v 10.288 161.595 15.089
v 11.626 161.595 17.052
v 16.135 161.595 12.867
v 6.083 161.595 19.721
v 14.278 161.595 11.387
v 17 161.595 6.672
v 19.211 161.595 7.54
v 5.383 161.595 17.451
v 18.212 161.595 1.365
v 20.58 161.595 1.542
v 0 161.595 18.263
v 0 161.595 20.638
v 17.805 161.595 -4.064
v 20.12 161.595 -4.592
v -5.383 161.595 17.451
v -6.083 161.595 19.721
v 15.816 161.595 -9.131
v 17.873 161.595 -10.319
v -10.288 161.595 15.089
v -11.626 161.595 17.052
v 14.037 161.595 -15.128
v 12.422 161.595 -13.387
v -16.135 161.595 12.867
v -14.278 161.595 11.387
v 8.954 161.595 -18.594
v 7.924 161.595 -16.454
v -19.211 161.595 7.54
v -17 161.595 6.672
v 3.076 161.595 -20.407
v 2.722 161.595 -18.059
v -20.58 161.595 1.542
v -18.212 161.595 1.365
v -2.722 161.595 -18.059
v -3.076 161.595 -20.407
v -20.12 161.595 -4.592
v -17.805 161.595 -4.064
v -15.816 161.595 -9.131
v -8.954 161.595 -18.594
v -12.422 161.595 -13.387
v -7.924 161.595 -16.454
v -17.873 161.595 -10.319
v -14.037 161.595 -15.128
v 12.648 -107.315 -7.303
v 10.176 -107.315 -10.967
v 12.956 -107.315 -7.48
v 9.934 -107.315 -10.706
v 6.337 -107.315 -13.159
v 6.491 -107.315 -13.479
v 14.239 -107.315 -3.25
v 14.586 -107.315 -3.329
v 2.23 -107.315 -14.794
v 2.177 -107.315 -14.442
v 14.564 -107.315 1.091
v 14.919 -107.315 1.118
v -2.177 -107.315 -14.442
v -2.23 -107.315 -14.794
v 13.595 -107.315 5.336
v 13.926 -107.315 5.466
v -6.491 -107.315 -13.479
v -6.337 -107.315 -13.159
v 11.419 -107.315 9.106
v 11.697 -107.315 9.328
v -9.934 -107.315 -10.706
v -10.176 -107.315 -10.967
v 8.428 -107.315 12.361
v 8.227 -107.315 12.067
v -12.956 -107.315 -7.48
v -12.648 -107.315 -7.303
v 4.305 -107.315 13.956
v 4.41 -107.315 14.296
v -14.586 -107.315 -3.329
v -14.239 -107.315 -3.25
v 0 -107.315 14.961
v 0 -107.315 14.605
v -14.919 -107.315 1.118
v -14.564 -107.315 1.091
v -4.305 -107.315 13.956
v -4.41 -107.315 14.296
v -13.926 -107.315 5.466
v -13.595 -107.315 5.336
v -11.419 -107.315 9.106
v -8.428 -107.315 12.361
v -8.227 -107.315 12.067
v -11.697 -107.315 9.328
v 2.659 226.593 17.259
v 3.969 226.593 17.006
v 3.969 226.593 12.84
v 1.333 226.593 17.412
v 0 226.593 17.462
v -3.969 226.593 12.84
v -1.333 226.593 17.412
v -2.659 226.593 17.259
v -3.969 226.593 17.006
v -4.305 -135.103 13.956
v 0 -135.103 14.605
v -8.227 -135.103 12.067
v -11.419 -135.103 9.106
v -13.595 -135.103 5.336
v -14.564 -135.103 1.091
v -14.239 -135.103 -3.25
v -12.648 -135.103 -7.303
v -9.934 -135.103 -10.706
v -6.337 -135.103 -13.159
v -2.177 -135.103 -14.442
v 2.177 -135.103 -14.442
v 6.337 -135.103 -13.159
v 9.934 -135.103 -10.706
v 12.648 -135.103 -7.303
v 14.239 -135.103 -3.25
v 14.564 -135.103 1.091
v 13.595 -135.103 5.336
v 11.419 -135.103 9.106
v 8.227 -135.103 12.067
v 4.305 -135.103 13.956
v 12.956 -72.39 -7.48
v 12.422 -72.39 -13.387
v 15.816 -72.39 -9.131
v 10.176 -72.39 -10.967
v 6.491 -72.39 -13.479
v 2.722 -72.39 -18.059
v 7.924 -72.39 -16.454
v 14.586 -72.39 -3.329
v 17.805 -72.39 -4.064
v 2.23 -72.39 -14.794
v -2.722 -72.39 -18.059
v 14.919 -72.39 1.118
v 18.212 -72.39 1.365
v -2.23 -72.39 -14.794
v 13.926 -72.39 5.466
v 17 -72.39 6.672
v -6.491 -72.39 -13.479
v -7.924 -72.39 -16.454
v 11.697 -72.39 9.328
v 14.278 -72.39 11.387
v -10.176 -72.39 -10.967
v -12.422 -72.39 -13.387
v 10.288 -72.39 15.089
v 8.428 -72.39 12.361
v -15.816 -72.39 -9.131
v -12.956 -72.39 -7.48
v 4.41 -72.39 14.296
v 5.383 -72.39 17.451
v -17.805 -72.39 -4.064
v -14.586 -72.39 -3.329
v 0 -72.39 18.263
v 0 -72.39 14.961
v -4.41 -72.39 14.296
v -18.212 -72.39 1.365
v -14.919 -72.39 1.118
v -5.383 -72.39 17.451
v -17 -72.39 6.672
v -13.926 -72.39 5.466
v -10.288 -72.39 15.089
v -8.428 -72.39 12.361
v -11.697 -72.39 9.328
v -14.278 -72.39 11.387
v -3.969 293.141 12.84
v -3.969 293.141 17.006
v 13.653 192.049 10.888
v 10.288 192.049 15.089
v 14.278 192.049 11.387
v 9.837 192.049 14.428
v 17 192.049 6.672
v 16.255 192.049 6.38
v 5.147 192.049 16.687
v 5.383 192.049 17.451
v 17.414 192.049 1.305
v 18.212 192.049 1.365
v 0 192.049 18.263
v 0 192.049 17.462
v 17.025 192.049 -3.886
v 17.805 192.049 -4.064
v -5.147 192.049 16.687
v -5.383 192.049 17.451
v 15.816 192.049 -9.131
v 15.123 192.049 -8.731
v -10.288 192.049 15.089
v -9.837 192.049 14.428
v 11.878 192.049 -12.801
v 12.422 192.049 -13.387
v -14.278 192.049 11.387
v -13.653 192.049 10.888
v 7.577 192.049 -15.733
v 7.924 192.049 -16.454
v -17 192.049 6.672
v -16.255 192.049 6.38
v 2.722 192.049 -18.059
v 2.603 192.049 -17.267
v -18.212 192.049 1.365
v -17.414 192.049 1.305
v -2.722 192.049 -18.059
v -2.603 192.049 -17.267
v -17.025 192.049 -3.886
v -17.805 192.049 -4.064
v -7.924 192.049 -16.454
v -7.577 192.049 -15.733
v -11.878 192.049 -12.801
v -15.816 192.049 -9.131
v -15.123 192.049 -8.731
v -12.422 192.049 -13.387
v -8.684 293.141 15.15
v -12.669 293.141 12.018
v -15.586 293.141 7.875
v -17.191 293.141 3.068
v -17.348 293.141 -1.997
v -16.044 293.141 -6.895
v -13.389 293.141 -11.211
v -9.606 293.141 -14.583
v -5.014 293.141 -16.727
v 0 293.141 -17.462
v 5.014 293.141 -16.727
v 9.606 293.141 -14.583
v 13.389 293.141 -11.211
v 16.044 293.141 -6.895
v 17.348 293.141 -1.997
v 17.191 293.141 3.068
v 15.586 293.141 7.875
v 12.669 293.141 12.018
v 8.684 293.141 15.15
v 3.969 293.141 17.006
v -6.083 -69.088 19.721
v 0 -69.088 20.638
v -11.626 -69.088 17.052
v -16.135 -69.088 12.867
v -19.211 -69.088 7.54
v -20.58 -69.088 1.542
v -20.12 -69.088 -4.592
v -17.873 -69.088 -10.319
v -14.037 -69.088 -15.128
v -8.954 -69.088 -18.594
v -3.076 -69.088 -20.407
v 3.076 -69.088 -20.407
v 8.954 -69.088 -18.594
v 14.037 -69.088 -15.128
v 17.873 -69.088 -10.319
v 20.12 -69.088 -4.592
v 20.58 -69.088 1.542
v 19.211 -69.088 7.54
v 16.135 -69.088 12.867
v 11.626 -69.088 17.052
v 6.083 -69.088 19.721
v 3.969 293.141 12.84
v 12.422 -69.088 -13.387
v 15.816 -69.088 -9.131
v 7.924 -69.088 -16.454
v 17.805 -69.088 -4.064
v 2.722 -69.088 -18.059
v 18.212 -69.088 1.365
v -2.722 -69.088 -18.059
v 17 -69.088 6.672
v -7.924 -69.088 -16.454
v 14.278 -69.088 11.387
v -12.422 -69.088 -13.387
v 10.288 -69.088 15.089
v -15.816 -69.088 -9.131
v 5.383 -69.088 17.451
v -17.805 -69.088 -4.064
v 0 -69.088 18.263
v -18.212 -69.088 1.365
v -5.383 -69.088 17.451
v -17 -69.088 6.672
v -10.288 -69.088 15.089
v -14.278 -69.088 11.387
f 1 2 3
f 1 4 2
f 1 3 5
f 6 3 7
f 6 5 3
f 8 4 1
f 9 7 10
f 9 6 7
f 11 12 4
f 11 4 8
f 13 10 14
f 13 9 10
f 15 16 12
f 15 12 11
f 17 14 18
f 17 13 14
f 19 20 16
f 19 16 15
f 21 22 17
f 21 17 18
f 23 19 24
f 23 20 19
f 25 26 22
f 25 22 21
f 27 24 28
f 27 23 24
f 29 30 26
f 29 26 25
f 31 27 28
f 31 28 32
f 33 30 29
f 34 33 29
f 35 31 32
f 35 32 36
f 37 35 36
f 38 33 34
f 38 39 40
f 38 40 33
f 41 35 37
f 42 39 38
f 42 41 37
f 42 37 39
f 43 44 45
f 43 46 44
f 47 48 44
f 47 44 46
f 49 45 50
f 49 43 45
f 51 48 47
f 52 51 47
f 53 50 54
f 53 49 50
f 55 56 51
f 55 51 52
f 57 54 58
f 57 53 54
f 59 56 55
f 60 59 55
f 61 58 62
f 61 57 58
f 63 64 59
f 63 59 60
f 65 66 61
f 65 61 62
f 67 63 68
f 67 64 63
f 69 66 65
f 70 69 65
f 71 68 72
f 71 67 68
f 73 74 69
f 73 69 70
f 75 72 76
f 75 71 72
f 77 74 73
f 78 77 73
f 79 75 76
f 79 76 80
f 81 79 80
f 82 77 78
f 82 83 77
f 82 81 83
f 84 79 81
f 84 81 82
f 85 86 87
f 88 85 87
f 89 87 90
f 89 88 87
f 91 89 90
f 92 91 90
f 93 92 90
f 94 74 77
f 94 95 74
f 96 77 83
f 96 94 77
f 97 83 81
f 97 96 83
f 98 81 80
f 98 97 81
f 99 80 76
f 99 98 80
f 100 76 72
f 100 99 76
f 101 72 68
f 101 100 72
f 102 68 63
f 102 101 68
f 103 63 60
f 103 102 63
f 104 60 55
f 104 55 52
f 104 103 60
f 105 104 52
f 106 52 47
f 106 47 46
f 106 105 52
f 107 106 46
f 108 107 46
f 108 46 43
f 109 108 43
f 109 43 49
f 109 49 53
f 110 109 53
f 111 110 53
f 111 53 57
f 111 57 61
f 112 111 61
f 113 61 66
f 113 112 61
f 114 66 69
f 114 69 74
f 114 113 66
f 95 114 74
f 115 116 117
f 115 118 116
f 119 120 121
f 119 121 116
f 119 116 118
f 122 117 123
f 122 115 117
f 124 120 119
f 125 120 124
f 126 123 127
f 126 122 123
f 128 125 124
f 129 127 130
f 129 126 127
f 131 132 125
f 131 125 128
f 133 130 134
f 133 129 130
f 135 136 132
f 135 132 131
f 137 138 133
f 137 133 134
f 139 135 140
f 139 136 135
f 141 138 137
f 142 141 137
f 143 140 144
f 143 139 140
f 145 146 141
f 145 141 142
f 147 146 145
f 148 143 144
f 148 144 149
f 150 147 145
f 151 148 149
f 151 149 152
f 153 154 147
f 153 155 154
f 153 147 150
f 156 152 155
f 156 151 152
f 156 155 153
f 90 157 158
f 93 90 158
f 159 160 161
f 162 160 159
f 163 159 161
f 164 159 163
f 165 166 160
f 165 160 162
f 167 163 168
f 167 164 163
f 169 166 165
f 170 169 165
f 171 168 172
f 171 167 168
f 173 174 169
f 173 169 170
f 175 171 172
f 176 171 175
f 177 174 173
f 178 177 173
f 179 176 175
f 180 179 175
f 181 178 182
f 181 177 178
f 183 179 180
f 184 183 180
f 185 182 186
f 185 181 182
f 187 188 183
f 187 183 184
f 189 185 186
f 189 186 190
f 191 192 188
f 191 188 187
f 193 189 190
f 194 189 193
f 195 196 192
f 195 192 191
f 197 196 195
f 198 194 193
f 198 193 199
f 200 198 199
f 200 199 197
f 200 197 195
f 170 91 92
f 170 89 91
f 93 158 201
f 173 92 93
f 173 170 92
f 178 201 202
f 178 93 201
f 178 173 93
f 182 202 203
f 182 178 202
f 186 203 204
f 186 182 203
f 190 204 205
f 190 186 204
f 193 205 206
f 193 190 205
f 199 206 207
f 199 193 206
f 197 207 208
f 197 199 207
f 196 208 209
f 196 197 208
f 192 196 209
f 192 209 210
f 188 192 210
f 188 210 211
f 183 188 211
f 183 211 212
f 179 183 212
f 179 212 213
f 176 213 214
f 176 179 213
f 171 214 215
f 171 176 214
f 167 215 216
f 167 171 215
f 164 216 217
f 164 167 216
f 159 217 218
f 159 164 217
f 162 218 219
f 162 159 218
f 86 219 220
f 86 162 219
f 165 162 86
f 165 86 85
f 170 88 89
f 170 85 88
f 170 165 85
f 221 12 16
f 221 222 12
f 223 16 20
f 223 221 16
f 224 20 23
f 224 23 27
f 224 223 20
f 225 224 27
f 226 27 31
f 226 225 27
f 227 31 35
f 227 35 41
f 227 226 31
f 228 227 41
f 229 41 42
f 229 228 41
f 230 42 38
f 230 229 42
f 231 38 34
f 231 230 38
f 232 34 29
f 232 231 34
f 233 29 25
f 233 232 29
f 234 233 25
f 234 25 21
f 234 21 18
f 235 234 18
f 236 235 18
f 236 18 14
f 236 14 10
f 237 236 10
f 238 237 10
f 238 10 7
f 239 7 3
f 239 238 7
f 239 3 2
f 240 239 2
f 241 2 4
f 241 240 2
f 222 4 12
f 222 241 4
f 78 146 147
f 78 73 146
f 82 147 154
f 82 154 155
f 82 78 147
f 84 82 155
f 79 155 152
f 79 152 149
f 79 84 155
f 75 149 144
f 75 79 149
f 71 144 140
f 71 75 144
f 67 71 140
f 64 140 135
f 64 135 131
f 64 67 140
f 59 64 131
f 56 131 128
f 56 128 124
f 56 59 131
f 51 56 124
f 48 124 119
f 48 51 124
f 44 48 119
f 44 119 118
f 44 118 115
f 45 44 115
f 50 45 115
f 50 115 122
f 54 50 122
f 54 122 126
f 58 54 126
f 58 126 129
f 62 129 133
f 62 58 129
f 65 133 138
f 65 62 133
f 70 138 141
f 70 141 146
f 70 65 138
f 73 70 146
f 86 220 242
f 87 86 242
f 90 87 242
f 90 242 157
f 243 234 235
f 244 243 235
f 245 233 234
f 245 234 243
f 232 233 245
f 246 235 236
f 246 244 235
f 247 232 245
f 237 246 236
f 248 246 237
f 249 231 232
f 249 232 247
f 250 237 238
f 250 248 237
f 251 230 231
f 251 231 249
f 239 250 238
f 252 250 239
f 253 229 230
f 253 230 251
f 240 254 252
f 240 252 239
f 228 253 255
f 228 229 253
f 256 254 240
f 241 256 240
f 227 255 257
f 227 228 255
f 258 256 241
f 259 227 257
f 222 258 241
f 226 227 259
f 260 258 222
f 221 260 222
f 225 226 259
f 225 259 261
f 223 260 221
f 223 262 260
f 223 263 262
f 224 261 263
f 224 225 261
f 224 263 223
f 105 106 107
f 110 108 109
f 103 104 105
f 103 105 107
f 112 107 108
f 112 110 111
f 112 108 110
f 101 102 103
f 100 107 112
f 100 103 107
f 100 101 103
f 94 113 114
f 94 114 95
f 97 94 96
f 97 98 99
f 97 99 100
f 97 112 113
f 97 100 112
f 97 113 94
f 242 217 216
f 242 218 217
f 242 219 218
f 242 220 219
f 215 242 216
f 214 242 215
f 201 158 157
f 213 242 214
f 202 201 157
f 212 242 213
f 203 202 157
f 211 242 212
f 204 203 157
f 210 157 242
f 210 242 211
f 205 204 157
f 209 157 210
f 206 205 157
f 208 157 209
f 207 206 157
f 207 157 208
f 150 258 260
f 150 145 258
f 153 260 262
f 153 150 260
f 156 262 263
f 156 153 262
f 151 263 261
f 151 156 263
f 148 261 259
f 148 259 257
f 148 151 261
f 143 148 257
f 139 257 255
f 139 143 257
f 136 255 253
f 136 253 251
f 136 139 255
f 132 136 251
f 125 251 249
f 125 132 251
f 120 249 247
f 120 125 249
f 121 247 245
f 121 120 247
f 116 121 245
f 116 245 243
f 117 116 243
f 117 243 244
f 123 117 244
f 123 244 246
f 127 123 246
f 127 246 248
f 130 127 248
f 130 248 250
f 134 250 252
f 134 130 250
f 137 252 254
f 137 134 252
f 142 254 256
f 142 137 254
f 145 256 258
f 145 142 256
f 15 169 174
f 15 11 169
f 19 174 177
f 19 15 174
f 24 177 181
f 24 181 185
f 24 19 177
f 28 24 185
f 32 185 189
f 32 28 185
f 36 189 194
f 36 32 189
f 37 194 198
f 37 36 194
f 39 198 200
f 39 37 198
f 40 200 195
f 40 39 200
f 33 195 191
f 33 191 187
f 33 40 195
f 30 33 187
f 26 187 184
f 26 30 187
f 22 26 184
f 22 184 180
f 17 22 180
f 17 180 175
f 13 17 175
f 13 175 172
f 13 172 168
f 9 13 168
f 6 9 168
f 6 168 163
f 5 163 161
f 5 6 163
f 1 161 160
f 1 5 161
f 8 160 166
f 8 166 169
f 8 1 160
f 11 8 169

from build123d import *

# Parameters (mm, degrees)
F3_DEPTH = 66.548


# Not quite as in the source:
# - a feature names something its author has since deleted; it is built from what else it names


with BuildPart() as f1:
    # F0 (on Right) → F1 (revolve)
    with BuildSketch(Plane.YZ):
        Polygon((-107.315, 14.605), (-135.1026, 14.605), (-135.1026, 0), (0, 0), (293.1414, 0), (293.1414, 17.4625), (192.0494, 17.4625), (192.0494, 18.2626), (161.5948, 18.2626), (161.5948, 20.6375), (-69.088, 20.6375), (-69.088, 18.2626), (-72.39, 18.2626), (-72.39, 14.9606), (-107.315, 14.9606), align=None)
    revolve(axis=Axis((0, 146.5707, 0), (0, -1, 0)))

    # F2 (on face) → F3 (cut)
    with BuildSketch(Plane(origin=(0, 293.1414, 0), x_dir=(-1, 0, 0), z_dir=(0, 1, 0))):
        with BuildLine():
            Line((-3.96875, 17.0055264455), (-3.96875, 12.8397))
            Line((-3.96875, 12.8397), (3.96875, 12.8397))
            Line((3.96875, 12.8397), (3.96875, 17.0055264455))
            ThreePointArc((3.96875, 17.0055264455), (0, 17.4625), (-3.96875, 17.0055264455))
        make_face()
    extrude(amount=-F3_DEPTH, mode=Mode.SUBTRACT)


solid = f1.part
